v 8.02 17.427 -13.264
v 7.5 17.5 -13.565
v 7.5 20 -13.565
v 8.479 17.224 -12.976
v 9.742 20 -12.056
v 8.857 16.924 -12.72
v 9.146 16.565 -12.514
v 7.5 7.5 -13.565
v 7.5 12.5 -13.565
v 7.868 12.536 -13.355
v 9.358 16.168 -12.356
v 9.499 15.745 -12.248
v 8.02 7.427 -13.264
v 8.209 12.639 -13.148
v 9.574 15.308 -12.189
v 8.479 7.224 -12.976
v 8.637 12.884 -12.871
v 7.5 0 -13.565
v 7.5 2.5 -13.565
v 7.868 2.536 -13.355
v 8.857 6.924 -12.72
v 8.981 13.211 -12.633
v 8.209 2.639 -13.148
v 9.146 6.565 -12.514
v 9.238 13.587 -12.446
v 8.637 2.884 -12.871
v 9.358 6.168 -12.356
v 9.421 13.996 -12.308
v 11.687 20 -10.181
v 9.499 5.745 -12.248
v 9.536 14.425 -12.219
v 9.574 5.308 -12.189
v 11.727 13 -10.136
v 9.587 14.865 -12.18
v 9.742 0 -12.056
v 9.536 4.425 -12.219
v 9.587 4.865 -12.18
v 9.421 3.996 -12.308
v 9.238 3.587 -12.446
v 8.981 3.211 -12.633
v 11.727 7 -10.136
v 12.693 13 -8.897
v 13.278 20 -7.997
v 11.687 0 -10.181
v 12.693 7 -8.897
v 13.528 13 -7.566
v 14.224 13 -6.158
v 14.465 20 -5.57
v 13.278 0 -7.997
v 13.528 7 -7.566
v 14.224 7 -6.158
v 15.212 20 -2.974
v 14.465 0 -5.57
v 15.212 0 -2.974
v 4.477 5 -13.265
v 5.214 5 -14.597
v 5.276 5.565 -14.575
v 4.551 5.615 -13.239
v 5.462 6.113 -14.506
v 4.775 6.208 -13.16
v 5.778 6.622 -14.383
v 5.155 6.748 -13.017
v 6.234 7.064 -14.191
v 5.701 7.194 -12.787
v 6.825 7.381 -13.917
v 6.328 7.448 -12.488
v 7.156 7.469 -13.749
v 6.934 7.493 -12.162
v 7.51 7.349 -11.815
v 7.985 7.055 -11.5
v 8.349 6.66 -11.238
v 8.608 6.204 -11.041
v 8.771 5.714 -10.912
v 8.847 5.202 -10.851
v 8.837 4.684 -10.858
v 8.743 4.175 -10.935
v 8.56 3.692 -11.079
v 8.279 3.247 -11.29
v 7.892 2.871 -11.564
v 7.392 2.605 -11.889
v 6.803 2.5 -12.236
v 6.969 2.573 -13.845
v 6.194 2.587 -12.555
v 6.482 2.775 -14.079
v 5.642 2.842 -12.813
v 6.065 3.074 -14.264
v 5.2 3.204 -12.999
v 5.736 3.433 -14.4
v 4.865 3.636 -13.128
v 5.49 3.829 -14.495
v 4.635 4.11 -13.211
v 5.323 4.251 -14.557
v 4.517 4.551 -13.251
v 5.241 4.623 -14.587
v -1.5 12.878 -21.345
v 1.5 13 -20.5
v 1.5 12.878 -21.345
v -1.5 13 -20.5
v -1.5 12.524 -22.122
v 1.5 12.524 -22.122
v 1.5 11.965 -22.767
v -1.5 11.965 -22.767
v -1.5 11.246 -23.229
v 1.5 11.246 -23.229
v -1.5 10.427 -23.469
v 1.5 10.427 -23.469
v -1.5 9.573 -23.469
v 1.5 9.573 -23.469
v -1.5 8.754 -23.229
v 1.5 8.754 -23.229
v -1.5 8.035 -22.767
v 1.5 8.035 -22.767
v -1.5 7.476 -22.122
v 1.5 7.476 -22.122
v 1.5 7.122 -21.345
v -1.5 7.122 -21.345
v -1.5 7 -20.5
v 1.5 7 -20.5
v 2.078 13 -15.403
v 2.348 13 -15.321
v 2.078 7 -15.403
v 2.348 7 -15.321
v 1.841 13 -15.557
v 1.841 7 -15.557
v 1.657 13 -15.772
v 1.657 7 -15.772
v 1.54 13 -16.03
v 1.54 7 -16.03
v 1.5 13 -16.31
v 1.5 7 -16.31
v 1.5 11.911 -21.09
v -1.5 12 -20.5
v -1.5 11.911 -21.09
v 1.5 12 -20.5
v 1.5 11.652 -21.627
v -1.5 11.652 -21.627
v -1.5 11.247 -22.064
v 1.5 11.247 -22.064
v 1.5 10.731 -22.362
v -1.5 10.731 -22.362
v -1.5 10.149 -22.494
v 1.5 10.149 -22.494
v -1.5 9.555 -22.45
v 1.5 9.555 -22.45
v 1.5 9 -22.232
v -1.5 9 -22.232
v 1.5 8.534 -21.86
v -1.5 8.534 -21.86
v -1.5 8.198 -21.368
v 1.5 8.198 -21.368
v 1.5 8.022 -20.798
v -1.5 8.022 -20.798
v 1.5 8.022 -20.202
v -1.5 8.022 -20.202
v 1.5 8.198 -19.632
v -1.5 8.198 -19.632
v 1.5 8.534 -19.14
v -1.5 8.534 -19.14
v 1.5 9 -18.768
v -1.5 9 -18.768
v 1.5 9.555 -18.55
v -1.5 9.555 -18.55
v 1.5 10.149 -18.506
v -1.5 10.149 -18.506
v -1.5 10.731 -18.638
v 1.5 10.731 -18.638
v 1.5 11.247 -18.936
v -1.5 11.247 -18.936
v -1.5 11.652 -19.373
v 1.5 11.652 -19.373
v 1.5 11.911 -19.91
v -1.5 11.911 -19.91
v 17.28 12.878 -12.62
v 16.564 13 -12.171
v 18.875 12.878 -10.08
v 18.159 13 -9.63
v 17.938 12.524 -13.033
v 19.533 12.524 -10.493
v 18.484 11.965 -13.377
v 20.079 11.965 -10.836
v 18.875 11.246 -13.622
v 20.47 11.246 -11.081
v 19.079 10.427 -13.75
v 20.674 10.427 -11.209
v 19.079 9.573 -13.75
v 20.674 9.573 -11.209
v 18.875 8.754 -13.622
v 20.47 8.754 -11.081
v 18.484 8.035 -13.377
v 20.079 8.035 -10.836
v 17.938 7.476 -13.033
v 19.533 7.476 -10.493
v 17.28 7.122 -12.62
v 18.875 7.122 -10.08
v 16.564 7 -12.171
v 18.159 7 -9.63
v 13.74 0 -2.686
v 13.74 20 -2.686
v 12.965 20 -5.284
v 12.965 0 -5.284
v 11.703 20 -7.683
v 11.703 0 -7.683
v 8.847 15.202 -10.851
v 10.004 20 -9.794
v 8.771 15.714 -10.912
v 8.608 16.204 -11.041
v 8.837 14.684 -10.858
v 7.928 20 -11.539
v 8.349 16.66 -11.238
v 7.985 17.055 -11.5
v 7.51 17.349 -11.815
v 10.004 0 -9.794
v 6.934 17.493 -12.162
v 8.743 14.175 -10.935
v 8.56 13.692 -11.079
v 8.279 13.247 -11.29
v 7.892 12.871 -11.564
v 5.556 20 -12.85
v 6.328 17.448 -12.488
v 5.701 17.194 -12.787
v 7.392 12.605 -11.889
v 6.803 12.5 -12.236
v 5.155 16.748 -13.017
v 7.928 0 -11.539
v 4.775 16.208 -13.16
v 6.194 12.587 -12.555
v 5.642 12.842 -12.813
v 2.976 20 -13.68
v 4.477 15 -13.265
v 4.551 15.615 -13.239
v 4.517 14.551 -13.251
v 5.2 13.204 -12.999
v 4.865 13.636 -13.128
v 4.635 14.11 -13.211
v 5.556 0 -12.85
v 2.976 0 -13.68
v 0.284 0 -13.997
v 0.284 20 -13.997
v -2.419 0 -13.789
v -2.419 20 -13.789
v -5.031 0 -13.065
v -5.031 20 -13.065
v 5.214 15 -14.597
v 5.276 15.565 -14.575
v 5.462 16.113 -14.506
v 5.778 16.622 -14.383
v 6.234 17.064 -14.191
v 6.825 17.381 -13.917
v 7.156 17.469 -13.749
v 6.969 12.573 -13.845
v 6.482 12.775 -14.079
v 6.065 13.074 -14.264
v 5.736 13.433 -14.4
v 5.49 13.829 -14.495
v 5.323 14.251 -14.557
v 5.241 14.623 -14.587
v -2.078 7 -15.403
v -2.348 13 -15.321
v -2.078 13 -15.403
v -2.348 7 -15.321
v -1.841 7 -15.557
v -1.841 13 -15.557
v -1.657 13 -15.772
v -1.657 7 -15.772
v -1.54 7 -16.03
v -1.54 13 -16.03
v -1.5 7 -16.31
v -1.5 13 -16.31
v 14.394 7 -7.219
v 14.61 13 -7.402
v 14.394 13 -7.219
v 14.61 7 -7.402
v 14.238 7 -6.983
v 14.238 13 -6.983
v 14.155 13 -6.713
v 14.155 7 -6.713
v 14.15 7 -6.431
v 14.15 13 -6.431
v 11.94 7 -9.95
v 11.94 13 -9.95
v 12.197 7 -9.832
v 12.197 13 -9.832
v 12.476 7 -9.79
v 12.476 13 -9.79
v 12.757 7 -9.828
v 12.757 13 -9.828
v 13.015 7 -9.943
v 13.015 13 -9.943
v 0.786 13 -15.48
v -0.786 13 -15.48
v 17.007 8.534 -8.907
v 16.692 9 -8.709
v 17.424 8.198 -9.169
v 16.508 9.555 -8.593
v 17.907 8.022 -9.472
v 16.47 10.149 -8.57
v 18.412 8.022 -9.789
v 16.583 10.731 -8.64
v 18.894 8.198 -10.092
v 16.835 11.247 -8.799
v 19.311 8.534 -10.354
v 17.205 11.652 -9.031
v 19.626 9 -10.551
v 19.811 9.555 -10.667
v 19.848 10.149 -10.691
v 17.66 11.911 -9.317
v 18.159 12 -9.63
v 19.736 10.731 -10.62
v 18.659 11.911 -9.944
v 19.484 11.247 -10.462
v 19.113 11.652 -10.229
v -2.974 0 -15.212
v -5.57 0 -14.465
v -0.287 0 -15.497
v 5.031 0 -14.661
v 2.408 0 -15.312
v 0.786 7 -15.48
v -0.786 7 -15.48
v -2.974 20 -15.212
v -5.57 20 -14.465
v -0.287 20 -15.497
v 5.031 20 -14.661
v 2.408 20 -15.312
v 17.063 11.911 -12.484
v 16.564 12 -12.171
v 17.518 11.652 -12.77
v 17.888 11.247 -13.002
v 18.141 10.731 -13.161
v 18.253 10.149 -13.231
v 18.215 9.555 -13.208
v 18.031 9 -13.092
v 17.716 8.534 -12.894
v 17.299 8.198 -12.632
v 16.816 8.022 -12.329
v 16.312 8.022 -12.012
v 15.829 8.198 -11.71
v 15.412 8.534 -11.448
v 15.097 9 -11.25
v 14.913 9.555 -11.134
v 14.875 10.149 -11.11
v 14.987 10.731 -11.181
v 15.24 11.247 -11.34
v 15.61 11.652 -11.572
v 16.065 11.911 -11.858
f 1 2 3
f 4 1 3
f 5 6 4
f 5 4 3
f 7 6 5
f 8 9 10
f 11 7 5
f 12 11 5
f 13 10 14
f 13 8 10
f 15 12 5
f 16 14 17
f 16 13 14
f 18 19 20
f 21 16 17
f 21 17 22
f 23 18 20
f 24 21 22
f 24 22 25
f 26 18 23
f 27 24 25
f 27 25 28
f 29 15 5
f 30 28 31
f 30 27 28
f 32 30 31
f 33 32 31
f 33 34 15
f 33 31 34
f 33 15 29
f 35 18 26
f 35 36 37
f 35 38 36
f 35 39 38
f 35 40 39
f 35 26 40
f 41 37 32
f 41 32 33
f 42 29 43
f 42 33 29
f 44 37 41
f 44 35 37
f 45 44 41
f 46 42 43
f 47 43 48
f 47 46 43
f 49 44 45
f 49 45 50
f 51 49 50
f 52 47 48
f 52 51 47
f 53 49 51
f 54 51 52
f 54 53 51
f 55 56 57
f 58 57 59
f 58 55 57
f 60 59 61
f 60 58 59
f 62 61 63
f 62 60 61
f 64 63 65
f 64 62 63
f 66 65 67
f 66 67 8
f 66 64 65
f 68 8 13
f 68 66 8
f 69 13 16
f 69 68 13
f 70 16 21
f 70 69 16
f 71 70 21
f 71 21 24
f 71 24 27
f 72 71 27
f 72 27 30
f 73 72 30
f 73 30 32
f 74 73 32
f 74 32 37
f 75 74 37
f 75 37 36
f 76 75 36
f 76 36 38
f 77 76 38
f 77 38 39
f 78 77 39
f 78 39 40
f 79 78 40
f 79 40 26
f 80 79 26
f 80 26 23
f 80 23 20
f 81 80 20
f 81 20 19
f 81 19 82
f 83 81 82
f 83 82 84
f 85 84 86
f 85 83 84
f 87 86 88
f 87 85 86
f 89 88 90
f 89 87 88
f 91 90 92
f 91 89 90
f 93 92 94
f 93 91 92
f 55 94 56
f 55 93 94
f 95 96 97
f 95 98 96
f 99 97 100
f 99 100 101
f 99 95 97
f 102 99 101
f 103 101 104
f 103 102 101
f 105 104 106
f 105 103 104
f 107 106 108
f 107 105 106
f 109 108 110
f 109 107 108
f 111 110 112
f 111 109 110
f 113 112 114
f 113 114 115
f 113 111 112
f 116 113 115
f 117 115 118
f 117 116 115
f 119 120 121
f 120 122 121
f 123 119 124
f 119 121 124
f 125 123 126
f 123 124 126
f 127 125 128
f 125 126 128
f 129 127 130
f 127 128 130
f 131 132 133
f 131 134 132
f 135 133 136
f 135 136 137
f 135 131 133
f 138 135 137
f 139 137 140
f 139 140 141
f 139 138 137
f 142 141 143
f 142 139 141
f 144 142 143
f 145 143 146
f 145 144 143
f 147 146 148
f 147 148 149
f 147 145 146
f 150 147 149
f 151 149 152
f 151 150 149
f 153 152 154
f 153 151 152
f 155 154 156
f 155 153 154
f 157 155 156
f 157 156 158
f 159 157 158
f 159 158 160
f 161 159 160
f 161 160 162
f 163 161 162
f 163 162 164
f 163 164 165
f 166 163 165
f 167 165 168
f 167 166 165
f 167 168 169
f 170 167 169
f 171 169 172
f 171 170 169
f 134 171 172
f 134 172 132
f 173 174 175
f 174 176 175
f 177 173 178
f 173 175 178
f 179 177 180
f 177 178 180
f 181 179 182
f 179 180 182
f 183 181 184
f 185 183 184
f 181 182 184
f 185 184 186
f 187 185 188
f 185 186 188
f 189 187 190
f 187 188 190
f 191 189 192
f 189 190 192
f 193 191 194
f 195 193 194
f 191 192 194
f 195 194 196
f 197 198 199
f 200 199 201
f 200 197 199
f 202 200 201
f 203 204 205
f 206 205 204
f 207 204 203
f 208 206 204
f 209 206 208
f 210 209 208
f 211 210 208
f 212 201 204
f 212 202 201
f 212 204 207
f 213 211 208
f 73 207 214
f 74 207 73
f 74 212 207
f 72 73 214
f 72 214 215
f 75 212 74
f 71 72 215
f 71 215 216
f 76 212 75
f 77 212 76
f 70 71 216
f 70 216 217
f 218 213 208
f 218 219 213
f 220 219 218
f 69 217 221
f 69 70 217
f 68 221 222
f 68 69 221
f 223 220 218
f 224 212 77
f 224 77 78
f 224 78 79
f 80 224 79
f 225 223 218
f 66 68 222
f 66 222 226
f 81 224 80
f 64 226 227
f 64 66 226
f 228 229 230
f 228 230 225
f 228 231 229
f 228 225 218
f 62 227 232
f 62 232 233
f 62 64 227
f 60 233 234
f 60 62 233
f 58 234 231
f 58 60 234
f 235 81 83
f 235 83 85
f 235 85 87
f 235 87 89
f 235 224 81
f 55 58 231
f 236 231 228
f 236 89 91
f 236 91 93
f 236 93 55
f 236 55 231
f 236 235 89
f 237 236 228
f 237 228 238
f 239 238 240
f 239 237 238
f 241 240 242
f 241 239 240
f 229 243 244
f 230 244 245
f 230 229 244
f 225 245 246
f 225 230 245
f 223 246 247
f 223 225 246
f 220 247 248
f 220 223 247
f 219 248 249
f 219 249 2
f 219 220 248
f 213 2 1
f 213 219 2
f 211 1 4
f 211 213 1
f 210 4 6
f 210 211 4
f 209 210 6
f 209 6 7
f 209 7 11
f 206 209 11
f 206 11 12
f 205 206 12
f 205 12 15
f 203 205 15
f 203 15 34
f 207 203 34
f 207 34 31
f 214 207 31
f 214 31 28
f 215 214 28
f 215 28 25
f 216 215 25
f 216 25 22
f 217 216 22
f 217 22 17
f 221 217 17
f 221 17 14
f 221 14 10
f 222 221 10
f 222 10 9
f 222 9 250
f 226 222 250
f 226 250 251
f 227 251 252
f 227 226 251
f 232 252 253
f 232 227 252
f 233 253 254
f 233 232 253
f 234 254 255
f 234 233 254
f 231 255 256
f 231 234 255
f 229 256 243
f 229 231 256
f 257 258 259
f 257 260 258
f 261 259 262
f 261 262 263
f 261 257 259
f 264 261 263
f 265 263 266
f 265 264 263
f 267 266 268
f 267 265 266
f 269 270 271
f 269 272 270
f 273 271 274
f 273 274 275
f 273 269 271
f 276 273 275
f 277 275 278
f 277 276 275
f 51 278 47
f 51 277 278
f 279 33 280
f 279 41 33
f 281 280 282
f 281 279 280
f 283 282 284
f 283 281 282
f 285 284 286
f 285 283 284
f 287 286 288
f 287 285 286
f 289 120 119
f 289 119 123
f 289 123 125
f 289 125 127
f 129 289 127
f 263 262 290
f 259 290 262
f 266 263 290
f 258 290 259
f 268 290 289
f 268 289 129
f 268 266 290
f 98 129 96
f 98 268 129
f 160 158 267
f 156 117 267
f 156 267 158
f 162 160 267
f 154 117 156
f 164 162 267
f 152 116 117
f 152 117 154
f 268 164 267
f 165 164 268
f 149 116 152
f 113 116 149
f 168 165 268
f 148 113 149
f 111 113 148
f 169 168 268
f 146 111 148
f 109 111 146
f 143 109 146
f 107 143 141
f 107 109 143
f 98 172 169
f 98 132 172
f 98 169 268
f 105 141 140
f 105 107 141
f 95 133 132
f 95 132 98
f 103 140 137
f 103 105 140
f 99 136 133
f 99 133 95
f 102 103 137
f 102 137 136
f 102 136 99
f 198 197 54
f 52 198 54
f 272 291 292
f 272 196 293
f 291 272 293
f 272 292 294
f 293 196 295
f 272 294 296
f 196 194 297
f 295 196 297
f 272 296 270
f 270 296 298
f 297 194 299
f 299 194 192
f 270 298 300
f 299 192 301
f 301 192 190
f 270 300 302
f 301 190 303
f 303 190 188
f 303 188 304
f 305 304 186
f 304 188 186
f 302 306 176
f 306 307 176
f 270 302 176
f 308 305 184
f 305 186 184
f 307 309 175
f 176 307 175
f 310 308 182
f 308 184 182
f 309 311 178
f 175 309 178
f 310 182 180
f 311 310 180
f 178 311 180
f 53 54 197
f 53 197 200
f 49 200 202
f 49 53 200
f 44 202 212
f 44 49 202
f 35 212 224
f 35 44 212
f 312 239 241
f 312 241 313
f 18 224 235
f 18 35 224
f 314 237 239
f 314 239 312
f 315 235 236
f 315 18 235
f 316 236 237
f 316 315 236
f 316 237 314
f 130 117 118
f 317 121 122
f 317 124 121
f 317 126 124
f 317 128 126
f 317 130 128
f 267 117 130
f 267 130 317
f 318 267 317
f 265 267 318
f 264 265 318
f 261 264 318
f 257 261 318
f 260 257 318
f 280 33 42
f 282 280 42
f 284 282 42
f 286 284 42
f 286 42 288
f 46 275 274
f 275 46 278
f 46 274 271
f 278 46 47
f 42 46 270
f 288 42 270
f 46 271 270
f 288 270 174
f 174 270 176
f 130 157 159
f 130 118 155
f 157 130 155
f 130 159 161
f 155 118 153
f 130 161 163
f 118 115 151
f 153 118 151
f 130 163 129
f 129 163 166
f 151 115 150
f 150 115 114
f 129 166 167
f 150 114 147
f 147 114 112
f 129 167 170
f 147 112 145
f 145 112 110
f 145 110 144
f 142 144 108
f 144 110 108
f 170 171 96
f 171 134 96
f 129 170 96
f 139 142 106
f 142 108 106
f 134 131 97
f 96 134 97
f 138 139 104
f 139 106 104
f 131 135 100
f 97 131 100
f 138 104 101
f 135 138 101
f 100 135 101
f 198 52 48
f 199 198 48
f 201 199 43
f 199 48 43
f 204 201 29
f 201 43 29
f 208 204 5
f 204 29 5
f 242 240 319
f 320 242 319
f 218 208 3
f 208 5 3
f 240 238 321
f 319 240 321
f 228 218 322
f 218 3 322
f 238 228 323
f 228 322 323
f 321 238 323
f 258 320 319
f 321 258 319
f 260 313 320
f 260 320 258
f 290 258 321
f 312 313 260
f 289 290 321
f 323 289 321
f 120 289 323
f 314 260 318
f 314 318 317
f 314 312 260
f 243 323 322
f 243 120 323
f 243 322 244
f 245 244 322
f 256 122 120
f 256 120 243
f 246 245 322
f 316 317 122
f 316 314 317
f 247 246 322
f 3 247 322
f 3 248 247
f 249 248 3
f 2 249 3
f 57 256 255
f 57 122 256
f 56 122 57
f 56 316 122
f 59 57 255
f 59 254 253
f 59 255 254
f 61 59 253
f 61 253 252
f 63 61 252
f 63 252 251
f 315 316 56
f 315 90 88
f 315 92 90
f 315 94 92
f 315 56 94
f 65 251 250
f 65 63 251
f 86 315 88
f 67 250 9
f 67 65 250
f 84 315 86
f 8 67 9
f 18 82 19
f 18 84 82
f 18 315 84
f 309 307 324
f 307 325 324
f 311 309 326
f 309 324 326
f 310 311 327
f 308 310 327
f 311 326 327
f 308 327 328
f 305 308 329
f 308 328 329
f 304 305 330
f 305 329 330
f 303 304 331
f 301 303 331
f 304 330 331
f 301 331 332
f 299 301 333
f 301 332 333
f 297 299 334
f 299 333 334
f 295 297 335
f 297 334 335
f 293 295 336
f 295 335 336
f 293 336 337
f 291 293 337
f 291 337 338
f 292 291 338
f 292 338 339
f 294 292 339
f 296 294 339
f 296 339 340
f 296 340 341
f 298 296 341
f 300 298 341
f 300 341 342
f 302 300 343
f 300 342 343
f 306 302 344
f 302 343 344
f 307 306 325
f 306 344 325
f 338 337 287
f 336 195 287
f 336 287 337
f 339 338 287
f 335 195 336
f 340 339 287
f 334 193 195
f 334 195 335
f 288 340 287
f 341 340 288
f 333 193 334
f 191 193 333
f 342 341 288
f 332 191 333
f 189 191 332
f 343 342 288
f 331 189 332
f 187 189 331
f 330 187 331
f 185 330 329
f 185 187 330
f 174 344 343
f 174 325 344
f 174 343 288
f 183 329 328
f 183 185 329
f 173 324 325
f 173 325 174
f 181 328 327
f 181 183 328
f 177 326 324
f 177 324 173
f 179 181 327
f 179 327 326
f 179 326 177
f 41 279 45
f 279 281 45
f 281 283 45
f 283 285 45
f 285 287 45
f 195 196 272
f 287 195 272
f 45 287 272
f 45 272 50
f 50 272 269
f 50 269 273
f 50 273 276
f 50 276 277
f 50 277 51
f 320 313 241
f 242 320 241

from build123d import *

# Parameters (mm, degrees)
SKETCH2_R               = 15.5
SKETCH2_R_2             = 14
BOSS_EXTRUDE1_DEPTH     = 20
SKETCH3_OUTSIDE_W       = 42.638
SKETCH3_OUTSIDE_H       = 42.638
CUT_EXTRUDE1_DEPTH      = 21
SKETCH6_R               = 2
BOSS_EXTRUDE2_DEPTH     = 1.5
CUT_EXTRUDE4_DEPTH      = 21
CUT_EXTRUDE4_DEPTH_BACK = 10
SKETCH9_R               = 2.5
CUT_EXTRUDE5_DEPTH      = 10
FILLET1_R               = 1


with BuildPart() as part:
    # Sketch2 → Boss-Extrude1 (new body)
    with BuildSketch(Plane(origin=(0, 0, 0), x_dir=(1, 0, 0), z_dir=(0, 1, 0))):
        Circle(SKETCH2_R)
        Circle(SKETCH2_R_2, mode=Mode.SUBTRACT)
    boss_extrude1 = extrude(amount=BOSS_EXTRUDE1_DEPTH)

    # Sketch3 outside → Cut-Extrude1 (cut, through all)
    with BuildSketch(Plane(origin=(0, 20, 0), x_dir=(1, 0, 0), z_dir=(0, 1, 0))):
        Rectangle(SKETCH3_OUTSIDE_W, SKETCH3_OUTSIDE_H)
        with BuildLine():
            Line((0, 0), (7.5, 13.564659966))
            ThreePointArc((7.5, 13.564659966), (0, 15.5), (-7.5, 13.564659966))
            Line((-7.5, 13.564659966), (0, 0))
        make_face(mode=Mode.SUBTRACT)
    extrude(amount=-CUT_EXTRUDE1_DEPTH, mode=Mode.SUBTRACT)

    # Sketch6 → Boss-Extrude2 (add, symmetric)
    with BuildSketch(Plane(origin=(0, 7.5, 0), x_dir=(0, 1, 0), z_dir=(-1, 0, 0))):
        with BuildLine():
            Line((-0.5, 20.5), (-0.5, 15.25))
            Line((-0.5, 15.25), (5.5, 15.25))
            Line((5.5, 15.25), (5.5, 20.5))
            ThreePointArc((5.5, 20.5), (2.5, 23.5), (-0.5, 20.5))
        make_face()
        with Locations((2.5, 20.5)):
            Circle(SKETCH6_R, mode=Mode.SUBTRACT)
    boss_extrude2 = extrude(amount=BOSS_EXTRUDE2_DEPTH, both=True)

    # Mirror2: Boss-Extrude1, Boss-Extrude2 across plane
    add(boss_extrude1.mirror(Plane(origin=(0, 0, 0), x_dir=(-0.483870968, 0, 0.875139353), z_dir=(0.875139353, 0, 0.483870968))))
    add(boss_extrude2.mirror(Plane(origin=(0, 0, 0), x_dir=(-0.483870968, 0, 0.875139353), z_dir=(0.875139353, 0, 0.483870968))))

    # Sketch8 → Cut-Extrude4 (cut, two sides)
    with BuildSketch(Plane(origin=(0, 0, 0), x_dir=(1, 0, 0), z_dir=(0, 1, 0))) as cut_extrude4_sk:
        with BuildLine():
            Line((-5.570225317, 14.464528679), (0, 0))
            Line((0, 0), (15.212039463, 2.973862033))
            ThreePointArc((15.212039463, 2.973862033), (-7.5, -13.564659966), (-5.570225317, 14.464528679))
        make_face()
    extrude(amount=CUT_EXTRUDE4_DEPTH, mode=Mode.SUBTRACT)
    extrude(cut_extrude4_sk.sketch, amount=-CUT_EXTRUDE4_DEPTH_BACK, mode=Mode.SUBTRACT)

    # Sketch9 → Cut-Extrude5 (cut)
    with BuildSketch(Plane(origin=(4.354367679, 0, -7.875402257), x_dir=(-0.875139353, 0, -0.483870968), z_dir=(0.483870968, 0, -0.875139353))):
        with Locations((0, 15)):
            Circle(SKETCH9_R)
        with Locations((0, 5)):
            Circle(SKETCH9_R)
    extrude(amount=CUT_EXTRUDE5_DEPTH, mode=Mode.SUBTRACT)

    # Fillet1
    fillet1_edges = [part.edges().sort_by_distance(p)[0] for p in [
        (-1.5, 10, -15.427248621),
        (1.5, 10, -15.427248621),
        (13.863083148, 10, -6.932887251),
        (12.267869828, 10, -9.473614404),
    ]]
    fillet(fillet1_edges, radius=FILLET1_R)


solid = part.part
